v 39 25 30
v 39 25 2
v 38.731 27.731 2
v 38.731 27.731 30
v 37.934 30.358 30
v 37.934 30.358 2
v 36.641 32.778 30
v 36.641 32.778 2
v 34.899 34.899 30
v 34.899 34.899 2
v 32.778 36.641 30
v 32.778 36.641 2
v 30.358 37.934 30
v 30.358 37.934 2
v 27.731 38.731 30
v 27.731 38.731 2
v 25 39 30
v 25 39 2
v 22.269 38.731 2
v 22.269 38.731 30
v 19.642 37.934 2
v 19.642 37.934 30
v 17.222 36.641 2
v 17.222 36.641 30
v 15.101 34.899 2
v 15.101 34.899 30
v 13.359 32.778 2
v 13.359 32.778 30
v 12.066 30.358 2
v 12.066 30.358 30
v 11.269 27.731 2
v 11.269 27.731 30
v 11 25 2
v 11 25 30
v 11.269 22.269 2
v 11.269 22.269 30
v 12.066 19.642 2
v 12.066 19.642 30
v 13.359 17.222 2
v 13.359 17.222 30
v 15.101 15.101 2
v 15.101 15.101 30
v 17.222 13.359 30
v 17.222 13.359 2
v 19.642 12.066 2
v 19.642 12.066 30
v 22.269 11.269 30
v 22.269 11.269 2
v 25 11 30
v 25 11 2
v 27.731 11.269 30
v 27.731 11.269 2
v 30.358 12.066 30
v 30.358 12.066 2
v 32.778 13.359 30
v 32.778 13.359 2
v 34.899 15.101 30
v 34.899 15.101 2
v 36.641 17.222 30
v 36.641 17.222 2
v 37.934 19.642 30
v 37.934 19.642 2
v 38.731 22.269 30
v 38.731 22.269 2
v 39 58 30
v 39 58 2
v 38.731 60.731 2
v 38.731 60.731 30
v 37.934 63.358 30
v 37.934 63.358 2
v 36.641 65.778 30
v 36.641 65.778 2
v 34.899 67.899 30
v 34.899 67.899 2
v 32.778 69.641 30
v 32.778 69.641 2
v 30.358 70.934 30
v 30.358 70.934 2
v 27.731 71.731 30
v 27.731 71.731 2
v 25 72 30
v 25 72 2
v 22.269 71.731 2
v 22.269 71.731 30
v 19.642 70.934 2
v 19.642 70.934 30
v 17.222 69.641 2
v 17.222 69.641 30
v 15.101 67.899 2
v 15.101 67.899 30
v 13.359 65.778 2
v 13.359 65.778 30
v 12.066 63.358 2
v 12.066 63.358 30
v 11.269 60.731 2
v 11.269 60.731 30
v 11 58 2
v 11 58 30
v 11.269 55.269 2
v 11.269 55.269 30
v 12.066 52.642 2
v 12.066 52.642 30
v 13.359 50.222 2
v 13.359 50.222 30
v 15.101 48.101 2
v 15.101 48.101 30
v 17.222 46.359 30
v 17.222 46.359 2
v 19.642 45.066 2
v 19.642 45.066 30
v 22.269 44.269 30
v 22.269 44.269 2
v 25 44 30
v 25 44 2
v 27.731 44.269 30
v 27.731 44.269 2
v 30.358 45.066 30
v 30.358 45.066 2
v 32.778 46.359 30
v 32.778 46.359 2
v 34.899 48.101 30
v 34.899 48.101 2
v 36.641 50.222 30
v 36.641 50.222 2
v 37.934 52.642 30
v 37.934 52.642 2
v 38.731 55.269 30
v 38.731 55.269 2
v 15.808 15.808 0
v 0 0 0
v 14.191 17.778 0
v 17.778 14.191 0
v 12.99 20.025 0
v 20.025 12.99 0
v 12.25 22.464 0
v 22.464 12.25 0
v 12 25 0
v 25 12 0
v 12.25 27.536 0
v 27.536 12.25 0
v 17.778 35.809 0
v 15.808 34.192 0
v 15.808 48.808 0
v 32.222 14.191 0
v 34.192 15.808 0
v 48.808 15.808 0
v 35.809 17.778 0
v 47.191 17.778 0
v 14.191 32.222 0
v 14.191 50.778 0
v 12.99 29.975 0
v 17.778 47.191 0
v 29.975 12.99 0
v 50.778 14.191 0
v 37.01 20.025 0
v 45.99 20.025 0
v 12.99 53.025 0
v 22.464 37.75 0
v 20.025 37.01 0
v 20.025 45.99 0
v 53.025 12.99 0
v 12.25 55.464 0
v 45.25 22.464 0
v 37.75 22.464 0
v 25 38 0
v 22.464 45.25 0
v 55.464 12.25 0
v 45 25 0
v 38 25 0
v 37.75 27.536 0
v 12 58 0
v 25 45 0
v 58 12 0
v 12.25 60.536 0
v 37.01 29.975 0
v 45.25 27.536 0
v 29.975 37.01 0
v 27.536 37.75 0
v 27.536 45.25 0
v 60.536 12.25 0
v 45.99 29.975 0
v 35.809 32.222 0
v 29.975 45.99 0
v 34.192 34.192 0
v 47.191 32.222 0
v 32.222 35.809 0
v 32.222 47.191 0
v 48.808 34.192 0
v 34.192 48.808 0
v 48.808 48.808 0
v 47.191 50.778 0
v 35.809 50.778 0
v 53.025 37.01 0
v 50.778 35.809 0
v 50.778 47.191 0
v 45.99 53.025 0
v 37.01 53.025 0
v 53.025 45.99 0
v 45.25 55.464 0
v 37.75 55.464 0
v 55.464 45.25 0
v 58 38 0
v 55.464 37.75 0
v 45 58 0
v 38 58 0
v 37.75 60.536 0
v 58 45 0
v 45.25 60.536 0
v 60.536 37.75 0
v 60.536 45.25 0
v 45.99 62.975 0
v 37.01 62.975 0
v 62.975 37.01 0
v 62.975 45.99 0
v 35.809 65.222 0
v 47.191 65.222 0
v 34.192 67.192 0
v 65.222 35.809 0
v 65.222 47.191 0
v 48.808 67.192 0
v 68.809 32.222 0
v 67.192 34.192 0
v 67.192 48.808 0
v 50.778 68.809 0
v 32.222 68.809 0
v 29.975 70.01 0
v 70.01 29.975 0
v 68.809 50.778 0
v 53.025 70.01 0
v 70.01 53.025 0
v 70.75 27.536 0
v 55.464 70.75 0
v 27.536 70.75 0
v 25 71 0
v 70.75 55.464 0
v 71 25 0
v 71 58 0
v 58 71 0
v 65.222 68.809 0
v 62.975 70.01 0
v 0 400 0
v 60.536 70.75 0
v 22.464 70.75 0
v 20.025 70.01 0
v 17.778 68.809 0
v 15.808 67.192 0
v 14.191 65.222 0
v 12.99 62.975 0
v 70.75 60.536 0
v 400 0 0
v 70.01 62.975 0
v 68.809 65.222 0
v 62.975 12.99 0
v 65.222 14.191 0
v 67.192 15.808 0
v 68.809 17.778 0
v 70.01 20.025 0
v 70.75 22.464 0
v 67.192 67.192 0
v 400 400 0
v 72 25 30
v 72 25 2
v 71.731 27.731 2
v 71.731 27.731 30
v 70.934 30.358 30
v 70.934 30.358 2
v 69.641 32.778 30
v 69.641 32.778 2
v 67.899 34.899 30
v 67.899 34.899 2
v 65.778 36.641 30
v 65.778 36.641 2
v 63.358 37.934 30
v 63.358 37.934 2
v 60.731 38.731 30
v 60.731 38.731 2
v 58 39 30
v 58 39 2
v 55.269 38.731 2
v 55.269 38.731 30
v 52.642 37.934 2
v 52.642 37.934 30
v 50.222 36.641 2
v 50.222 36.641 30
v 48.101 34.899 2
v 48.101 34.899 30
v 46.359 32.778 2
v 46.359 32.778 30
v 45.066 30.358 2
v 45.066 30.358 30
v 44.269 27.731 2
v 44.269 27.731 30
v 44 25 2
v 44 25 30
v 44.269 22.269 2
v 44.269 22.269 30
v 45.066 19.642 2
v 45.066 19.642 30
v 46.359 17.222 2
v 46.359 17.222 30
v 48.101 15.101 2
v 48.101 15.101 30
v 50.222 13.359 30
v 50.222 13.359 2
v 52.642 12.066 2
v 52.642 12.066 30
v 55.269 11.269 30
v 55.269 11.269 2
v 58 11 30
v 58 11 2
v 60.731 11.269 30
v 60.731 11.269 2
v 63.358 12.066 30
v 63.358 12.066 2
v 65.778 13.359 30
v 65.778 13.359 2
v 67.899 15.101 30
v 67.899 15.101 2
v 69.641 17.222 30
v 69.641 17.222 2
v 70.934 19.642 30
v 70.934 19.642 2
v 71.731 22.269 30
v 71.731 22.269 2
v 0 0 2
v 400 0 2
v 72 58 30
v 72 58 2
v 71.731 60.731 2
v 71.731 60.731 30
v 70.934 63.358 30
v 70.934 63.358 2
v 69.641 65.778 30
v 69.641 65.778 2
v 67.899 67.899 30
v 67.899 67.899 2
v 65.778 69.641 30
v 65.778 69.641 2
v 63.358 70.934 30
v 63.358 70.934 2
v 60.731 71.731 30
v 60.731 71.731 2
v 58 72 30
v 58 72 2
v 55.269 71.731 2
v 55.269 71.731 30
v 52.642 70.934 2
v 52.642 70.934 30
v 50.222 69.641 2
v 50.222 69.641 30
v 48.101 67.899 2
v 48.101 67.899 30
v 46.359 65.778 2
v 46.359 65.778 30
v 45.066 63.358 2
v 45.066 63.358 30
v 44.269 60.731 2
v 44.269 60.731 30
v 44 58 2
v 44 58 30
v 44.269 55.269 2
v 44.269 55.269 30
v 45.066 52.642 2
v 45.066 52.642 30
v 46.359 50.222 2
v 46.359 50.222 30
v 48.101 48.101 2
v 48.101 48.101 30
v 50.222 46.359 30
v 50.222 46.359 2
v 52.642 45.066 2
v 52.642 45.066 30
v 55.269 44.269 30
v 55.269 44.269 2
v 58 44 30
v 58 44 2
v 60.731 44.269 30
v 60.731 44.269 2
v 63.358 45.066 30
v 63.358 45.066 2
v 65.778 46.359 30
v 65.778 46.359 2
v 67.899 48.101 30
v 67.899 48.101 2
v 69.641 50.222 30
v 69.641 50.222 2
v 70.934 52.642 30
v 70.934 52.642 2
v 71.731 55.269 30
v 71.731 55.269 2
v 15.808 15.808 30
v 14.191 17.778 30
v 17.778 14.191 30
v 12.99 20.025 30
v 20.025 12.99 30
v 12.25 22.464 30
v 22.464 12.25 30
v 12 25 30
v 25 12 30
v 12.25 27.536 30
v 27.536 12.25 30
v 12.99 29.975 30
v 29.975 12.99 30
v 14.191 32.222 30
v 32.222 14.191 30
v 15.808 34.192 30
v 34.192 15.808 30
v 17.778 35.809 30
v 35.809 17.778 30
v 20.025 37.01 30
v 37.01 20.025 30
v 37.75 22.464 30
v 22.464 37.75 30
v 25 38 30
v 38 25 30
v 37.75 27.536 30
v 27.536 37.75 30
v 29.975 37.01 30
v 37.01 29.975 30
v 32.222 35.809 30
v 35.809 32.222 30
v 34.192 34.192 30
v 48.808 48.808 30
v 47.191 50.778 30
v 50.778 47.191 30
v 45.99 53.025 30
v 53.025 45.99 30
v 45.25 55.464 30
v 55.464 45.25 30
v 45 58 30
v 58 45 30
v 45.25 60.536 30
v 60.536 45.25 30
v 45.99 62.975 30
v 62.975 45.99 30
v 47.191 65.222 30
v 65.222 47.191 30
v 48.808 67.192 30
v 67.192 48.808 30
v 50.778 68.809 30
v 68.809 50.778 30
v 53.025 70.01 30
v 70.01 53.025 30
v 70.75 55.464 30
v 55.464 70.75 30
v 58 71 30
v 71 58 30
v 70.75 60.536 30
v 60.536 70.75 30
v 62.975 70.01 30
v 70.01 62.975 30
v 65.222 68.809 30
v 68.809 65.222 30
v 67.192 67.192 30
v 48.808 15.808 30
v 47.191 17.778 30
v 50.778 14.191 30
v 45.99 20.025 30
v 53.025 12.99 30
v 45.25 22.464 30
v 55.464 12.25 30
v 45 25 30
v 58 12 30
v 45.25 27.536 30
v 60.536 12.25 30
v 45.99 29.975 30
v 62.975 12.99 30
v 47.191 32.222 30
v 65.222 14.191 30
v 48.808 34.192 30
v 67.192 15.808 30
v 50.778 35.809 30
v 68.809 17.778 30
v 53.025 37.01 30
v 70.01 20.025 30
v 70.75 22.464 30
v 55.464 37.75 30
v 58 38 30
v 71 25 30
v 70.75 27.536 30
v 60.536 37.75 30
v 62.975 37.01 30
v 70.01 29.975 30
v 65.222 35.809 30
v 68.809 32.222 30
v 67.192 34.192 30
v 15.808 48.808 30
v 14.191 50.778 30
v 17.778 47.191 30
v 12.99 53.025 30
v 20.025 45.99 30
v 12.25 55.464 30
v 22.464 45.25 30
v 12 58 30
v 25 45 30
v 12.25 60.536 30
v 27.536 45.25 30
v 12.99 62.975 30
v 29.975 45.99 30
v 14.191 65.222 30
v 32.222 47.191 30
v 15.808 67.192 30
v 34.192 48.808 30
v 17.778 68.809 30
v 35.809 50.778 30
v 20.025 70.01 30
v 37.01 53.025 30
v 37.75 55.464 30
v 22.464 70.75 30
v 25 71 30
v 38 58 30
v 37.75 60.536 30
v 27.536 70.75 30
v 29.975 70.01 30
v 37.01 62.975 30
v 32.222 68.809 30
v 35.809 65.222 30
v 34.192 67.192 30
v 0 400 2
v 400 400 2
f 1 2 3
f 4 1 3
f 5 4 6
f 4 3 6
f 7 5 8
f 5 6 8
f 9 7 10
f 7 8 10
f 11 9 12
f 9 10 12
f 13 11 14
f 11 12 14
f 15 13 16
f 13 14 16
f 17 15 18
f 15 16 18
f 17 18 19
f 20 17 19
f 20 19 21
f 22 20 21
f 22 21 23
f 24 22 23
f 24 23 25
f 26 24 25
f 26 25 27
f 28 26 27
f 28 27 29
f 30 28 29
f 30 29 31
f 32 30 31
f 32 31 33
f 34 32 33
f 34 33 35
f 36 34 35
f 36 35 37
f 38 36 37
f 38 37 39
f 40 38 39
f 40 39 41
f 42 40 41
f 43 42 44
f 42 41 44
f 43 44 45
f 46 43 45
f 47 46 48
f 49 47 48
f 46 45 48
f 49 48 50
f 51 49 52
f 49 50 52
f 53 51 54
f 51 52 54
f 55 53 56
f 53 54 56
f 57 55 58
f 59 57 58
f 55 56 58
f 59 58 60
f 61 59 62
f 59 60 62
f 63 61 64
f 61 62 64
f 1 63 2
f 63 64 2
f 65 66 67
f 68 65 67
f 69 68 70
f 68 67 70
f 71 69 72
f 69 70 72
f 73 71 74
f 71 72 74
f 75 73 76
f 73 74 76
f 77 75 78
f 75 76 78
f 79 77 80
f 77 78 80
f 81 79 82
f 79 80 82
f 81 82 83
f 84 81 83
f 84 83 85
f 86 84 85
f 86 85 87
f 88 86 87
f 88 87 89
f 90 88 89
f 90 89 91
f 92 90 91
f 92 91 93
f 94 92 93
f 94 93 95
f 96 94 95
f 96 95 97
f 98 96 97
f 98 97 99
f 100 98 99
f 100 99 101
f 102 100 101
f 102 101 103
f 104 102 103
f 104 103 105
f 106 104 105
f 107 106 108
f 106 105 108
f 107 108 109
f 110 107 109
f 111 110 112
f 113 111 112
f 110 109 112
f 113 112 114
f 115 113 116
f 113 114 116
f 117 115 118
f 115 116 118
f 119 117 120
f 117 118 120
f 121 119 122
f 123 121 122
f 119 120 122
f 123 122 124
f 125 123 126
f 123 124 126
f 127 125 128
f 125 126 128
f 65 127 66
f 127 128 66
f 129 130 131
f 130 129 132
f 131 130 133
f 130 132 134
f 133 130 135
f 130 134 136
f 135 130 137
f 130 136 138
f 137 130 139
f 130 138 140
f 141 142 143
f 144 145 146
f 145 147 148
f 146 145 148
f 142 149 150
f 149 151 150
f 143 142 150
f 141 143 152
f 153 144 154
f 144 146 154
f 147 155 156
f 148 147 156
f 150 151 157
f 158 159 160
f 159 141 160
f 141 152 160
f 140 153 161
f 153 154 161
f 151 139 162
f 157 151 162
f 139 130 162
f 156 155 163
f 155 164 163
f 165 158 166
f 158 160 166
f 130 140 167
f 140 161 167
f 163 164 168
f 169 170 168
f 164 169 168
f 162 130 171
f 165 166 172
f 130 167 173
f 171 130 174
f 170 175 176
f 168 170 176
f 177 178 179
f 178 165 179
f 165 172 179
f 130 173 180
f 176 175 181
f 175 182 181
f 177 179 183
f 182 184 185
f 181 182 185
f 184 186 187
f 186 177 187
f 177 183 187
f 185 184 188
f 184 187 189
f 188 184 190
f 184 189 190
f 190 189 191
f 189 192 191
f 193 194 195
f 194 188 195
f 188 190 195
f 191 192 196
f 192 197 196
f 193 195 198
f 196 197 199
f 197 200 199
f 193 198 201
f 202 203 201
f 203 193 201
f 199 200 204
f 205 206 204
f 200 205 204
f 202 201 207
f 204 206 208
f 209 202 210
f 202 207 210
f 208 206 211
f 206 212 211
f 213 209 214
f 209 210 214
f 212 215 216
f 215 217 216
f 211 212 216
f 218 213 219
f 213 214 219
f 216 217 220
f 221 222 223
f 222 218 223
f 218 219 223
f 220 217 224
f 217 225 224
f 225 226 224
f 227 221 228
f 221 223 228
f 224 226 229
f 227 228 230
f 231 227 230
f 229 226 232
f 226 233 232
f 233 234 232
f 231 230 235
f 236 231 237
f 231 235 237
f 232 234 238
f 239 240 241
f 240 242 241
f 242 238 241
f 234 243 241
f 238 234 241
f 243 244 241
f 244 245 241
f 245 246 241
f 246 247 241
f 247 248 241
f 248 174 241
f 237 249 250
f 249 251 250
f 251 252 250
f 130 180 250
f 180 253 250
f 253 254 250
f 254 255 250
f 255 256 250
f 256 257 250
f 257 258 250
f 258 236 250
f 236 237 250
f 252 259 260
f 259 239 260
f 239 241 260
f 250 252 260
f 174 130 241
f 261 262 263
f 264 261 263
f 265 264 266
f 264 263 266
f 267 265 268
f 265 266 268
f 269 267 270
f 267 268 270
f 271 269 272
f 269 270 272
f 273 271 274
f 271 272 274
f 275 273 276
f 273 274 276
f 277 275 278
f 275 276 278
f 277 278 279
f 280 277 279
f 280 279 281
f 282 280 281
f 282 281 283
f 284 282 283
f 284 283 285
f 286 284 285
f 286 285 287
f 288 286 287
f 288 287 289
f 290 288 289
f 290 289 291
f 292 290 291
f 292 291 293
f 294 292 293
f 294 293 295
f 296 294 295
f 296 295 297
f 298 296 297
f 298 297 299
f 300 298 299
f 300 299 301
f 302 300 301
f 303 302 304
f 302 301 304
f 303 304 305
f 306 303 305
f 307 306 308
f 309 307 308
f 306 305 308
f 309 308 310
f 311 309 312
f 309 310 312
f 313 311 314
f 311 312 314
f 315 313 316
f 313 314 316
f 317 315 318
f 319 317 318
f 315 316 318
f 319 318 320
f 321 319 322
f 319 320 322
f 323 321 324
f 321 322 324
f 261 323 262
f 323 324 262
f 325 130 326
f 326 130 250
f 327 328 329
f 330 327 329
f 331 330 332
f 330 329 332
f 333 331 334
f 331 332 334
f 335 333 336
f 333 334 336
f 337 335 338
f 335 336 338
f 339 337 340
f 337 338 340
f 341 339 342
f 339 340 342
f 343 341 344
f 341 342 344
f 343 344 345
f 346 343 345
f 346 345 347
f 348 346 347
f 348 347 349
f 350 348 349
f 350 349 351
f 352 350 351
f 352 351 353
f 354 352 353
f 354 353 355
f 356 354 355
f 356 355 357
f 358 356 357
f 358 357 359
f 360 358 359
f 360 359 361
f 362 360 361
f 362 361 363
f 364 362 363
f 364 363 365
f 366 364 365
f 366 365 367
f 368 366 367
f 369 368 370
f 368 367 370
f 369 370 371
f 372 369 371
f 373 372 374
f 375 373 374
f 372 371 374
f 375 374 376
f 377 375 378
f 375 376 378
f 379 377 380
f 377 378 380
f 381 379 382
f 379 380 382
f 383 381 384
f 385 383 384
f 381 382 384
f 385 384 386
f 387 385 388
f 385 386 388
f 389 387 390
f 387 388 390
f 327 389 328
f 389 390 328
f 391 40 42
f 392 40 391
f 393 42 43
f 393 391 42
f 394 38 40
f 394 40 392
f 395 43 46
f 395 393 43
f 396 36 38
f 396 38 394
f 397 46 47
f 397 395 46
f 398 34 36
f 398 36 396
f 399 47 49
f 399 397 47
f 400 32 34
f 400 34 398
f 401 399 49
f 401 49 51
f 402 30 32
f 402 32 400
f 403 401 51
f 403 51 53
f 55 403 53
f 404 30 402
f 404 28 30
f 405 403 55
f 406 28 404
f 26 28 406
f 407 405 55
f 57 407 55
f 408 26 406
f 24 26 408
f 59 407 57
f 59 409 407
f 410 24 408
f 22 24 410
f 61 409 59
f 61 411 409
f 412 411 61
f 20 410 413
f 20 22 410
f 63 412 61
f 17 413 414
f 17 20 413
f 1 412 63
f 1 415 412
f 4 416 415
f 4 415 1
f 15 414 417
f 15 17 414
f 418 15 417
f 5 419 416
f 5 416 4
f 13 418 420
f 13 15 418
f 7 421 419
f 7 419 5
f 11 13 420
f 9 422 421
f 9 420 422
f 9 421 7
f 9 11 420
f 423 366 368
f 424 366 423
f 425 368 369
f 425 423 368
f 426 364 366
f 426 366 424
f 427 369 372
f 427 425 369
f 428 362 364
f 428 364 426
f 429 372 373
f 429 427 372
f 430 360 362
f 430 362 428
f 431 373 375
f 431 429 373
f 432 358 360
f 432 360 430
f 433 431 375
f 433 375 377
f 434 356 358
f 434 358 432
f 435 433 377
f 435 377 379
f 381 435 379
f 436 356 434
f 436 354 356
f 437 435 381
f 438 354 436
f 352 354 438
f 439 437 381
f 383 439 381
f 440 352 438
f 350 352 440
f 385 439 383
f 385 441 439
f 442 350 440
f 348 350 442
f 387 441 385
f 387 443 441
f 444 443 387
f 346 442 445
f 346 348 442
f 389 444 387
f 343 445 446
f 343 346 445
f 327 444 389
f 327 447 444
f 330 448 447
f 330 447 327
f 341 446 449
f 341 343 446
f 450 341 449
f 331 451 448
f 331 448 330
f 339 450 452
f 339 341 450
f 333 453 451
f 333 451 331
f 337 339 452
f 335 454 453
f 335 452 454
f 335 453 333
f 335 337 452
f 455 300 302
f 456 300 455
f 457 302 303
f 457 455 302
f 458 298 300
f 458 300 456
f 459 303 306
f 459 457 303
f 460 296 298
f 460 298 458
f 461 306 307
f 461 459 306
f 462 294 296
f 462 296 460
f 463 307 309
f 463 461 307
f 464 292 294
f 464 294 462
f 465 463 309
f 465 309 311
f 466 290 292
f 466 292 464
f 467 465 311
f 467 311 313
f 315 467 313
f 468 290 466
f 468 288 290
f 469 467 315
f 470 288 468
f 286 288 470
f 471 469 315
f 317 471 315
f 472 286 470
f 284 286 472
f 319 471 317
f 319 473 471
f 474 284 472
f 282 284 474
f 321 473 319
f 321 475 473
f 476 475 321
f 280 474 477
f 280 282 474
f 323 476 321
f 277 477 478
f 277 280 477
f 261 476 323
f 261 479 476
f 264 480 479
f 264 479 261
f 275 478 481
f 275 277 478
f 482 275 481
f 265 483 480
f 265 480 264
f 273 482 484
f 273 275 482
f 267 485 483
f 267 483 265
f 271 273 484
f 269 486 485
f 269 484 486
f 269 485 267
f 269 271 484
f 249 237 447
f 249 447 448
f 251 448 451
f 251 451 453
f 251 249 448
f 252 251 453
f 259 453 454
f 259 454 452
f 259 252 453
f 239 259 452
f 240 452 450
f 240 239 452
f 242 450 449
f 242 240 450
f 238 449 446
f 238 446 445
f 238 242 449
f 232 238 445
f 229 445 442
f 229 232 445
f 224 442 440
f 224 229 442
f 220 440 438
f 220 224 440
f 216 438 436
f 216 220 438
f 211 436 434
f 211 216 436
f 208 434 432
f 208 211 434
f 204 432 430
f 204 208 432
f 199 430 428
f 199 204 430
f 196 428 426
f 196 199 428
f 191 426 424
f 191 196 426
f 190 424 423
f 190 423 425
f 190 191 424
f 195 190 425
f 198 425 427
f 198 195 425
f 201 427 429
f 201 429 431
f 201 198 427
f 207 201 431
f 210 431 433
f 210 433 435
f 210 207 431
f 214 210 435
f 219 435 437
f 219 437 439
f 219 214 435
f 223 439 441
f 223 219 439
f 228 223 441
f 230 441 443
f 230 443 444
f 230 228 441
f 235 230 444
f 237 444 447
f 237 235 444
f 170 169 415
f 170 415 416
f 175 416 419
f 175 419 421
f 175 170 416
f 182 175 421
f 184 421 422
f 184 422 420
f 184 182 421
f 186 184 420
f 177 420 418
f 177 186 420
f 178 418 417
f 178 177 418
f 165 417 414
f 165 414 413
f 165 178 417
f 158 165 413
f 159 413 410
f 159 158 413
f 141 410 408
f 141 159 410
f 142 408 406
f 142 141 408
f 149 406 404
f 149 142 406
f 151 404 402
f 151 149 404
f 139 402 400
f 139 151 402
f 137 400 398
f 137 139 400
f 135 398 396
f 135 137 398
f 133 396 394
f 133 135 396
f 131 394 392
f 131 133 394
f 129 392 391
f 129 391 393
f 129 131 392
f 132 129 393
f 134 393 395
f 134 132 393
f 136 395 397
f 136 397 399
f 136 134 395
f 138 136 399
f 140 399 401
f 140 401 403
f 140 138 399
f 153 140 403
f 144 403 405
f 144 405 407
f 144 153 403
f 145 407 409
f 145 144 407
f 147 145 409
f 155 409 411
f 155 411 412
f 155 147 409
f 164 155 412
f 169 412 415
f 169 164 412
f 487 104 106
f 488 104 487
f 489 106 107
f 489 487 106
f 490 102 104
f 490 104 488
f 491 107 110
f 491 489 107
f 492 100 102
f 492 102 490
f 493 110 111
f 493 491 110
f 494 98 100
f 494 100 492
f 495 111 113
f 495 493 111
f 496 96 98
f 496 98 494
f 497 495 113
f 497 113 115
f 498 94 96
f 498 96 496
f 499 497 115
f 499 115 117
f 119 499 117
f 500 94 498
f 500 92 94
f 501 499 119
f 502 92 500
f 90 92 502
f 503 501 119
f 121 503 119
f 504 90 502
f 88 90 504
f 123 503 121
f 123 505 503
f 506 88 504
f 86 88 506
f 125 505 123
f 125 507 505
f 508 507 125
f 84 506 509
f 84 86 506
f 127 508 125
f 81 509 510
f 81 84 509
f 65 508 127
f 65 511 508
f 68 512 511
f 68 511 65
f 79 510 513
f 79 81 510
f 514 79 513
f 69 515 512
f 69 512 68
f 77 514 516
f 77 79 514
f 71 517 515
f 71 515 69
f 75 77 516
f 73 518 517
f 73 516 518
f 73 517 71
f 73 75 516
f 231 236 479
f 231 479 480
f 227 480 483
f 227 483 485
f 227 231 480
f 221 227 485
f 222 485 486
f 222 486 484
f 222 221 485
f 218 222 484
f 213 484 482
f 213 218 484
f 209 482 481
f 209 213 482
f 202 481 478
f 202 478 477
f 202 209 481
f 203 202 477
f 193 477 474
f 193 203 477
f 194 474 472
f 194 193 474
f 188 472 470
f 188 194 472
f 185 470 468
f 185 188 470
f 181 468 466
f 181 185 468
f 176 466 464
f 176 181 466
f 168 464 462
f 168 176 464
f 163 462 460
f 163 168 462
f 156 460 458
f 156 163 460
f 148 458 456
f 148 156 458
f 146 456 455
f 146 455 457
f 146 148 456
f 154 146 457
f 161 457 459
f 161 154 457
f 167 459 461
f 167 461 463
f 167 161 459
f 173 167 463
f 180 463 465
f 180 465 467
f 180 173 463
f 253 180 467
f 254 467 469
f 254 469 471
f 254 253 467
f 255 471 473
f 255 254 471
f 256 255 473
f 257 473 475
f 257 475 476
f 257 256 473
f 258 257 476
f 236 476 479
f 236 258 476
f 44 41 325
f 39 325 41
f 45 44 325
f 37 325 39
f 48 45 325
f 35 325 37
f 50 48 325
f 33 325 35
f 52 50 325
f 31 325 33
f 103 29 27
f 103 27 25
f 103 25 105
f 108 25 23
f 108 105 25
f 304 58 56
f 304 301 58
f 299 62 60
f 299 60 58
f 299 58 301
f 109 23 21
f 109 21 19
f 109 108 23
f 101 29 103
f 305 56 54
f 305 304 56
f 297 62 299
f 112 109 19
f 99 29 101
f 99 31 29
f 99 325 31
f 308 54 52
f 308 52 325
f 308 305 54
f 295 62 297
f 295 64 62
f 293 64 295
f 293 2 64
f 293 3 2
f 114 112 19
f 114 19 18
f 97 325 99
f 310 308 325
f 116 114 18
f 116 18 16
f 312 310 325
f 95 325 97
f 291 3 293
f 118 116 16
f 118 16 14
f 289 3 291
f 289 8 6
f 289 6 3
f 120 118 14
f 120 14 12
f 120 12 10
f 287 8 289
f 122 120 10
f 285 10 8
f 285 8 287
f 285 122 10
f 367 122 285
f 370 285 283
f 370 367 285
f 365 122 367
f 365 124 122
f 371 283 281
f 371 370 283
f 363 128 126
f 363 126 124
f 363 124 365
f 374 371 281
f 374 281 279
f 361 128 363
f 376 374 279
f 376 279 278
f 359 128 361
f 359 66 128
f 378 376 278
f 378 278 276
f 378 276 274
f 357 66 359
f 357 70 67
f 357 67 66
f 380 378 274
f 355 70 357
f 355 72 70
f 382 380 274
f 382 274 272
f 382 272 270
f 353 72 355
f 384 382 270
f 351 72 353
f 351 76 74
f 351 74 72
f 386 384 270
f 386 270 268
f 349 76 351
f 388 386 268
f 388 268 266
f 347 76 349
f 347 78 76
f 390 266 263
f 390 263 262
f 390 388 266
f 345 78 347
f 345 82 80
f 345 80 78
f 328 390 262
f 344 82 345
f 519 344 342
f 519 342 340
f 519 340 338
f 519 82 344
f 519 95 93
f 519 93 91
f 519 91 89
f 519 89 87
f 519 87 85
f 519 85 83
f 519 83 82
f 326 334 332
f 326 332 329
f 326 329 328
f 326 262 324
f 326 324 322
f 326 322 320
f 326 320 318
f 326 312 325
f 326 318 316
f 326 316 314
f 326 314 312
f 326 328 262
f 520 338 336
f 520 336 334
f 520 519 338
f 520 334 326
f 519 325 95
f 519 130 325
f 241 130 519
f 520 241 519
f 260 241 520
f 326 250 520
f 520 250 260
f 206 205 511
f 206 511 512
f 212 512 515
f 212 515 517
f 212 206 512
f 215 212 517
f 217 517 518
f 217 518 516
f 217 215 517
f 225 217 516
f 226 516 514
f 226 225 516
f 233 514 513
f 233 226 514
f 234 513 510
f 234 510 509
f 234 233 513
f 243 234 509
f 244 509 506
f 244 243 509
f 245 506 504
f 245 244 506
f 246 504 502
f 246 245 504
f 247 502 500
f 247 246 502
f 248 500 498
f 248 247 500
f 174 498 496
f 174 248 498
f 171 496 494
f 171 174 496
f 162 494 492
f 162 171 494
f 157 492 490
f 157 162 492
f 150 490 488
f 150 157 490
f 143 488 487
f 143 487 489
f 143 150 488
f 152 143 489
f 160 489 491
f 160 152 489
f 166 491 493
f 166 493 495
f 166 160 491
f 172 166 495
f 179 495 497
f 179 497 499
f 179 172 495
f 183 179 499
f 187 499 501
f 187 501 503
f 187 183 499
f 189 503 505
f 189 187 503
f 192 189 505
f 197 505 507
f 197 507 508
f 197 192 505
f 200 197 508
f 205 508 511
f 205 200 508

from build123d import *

# Parameters (mm, degrees)
SKETCH_W     = 400
SKETCH_H     = 400
PAD_DEPTH    = 2
SKETCH001_R  = 14
PAD001_DEPTH = 30
SKETCH002_R  = 13
HOLE_DEPTH   = 30


with BuildPart() as part:
    # Sketch → Pad (new body)
    with BuildSketch(Plane.XY):
        with Locations((200, 200)):
            Rectangle(SKETCH_W, SKETCH_H)
    extrude(amount=PAD_DEPTH)

    # Sketch001 → Pad001 (join)
    with BuildSketch(Plane.XY):
        with Locations((25, 25)):
            Circle(SKETCH001_R)
        with Locations((58, 25)):
            Circle(SKETCH001_R)
        with Locations((58, 58)):
            Circle(SKETCH001_R)
        with Locations((25, 58)):
            Circle(SKETCH001_R)
    extrude(amount=PAD001_DEPTH)

    # Sketch002 → Hole (cut)
    with BuildSketch(Plane.XY):
        with Locations((25, 58)):
            Circle(SKETCH002_R)
        with Locations((58, 58)):
            Circle(SKETCH002_R)
        with Locations((58, 25)):
            Circle(SKETCH002_R)
        with Locations((25, 25)):
            Circle(SKETCH002_R)
    extrude(amount=HOLE_DEPTH, mode=Mode.SUBTRACT)


solid = part.part
